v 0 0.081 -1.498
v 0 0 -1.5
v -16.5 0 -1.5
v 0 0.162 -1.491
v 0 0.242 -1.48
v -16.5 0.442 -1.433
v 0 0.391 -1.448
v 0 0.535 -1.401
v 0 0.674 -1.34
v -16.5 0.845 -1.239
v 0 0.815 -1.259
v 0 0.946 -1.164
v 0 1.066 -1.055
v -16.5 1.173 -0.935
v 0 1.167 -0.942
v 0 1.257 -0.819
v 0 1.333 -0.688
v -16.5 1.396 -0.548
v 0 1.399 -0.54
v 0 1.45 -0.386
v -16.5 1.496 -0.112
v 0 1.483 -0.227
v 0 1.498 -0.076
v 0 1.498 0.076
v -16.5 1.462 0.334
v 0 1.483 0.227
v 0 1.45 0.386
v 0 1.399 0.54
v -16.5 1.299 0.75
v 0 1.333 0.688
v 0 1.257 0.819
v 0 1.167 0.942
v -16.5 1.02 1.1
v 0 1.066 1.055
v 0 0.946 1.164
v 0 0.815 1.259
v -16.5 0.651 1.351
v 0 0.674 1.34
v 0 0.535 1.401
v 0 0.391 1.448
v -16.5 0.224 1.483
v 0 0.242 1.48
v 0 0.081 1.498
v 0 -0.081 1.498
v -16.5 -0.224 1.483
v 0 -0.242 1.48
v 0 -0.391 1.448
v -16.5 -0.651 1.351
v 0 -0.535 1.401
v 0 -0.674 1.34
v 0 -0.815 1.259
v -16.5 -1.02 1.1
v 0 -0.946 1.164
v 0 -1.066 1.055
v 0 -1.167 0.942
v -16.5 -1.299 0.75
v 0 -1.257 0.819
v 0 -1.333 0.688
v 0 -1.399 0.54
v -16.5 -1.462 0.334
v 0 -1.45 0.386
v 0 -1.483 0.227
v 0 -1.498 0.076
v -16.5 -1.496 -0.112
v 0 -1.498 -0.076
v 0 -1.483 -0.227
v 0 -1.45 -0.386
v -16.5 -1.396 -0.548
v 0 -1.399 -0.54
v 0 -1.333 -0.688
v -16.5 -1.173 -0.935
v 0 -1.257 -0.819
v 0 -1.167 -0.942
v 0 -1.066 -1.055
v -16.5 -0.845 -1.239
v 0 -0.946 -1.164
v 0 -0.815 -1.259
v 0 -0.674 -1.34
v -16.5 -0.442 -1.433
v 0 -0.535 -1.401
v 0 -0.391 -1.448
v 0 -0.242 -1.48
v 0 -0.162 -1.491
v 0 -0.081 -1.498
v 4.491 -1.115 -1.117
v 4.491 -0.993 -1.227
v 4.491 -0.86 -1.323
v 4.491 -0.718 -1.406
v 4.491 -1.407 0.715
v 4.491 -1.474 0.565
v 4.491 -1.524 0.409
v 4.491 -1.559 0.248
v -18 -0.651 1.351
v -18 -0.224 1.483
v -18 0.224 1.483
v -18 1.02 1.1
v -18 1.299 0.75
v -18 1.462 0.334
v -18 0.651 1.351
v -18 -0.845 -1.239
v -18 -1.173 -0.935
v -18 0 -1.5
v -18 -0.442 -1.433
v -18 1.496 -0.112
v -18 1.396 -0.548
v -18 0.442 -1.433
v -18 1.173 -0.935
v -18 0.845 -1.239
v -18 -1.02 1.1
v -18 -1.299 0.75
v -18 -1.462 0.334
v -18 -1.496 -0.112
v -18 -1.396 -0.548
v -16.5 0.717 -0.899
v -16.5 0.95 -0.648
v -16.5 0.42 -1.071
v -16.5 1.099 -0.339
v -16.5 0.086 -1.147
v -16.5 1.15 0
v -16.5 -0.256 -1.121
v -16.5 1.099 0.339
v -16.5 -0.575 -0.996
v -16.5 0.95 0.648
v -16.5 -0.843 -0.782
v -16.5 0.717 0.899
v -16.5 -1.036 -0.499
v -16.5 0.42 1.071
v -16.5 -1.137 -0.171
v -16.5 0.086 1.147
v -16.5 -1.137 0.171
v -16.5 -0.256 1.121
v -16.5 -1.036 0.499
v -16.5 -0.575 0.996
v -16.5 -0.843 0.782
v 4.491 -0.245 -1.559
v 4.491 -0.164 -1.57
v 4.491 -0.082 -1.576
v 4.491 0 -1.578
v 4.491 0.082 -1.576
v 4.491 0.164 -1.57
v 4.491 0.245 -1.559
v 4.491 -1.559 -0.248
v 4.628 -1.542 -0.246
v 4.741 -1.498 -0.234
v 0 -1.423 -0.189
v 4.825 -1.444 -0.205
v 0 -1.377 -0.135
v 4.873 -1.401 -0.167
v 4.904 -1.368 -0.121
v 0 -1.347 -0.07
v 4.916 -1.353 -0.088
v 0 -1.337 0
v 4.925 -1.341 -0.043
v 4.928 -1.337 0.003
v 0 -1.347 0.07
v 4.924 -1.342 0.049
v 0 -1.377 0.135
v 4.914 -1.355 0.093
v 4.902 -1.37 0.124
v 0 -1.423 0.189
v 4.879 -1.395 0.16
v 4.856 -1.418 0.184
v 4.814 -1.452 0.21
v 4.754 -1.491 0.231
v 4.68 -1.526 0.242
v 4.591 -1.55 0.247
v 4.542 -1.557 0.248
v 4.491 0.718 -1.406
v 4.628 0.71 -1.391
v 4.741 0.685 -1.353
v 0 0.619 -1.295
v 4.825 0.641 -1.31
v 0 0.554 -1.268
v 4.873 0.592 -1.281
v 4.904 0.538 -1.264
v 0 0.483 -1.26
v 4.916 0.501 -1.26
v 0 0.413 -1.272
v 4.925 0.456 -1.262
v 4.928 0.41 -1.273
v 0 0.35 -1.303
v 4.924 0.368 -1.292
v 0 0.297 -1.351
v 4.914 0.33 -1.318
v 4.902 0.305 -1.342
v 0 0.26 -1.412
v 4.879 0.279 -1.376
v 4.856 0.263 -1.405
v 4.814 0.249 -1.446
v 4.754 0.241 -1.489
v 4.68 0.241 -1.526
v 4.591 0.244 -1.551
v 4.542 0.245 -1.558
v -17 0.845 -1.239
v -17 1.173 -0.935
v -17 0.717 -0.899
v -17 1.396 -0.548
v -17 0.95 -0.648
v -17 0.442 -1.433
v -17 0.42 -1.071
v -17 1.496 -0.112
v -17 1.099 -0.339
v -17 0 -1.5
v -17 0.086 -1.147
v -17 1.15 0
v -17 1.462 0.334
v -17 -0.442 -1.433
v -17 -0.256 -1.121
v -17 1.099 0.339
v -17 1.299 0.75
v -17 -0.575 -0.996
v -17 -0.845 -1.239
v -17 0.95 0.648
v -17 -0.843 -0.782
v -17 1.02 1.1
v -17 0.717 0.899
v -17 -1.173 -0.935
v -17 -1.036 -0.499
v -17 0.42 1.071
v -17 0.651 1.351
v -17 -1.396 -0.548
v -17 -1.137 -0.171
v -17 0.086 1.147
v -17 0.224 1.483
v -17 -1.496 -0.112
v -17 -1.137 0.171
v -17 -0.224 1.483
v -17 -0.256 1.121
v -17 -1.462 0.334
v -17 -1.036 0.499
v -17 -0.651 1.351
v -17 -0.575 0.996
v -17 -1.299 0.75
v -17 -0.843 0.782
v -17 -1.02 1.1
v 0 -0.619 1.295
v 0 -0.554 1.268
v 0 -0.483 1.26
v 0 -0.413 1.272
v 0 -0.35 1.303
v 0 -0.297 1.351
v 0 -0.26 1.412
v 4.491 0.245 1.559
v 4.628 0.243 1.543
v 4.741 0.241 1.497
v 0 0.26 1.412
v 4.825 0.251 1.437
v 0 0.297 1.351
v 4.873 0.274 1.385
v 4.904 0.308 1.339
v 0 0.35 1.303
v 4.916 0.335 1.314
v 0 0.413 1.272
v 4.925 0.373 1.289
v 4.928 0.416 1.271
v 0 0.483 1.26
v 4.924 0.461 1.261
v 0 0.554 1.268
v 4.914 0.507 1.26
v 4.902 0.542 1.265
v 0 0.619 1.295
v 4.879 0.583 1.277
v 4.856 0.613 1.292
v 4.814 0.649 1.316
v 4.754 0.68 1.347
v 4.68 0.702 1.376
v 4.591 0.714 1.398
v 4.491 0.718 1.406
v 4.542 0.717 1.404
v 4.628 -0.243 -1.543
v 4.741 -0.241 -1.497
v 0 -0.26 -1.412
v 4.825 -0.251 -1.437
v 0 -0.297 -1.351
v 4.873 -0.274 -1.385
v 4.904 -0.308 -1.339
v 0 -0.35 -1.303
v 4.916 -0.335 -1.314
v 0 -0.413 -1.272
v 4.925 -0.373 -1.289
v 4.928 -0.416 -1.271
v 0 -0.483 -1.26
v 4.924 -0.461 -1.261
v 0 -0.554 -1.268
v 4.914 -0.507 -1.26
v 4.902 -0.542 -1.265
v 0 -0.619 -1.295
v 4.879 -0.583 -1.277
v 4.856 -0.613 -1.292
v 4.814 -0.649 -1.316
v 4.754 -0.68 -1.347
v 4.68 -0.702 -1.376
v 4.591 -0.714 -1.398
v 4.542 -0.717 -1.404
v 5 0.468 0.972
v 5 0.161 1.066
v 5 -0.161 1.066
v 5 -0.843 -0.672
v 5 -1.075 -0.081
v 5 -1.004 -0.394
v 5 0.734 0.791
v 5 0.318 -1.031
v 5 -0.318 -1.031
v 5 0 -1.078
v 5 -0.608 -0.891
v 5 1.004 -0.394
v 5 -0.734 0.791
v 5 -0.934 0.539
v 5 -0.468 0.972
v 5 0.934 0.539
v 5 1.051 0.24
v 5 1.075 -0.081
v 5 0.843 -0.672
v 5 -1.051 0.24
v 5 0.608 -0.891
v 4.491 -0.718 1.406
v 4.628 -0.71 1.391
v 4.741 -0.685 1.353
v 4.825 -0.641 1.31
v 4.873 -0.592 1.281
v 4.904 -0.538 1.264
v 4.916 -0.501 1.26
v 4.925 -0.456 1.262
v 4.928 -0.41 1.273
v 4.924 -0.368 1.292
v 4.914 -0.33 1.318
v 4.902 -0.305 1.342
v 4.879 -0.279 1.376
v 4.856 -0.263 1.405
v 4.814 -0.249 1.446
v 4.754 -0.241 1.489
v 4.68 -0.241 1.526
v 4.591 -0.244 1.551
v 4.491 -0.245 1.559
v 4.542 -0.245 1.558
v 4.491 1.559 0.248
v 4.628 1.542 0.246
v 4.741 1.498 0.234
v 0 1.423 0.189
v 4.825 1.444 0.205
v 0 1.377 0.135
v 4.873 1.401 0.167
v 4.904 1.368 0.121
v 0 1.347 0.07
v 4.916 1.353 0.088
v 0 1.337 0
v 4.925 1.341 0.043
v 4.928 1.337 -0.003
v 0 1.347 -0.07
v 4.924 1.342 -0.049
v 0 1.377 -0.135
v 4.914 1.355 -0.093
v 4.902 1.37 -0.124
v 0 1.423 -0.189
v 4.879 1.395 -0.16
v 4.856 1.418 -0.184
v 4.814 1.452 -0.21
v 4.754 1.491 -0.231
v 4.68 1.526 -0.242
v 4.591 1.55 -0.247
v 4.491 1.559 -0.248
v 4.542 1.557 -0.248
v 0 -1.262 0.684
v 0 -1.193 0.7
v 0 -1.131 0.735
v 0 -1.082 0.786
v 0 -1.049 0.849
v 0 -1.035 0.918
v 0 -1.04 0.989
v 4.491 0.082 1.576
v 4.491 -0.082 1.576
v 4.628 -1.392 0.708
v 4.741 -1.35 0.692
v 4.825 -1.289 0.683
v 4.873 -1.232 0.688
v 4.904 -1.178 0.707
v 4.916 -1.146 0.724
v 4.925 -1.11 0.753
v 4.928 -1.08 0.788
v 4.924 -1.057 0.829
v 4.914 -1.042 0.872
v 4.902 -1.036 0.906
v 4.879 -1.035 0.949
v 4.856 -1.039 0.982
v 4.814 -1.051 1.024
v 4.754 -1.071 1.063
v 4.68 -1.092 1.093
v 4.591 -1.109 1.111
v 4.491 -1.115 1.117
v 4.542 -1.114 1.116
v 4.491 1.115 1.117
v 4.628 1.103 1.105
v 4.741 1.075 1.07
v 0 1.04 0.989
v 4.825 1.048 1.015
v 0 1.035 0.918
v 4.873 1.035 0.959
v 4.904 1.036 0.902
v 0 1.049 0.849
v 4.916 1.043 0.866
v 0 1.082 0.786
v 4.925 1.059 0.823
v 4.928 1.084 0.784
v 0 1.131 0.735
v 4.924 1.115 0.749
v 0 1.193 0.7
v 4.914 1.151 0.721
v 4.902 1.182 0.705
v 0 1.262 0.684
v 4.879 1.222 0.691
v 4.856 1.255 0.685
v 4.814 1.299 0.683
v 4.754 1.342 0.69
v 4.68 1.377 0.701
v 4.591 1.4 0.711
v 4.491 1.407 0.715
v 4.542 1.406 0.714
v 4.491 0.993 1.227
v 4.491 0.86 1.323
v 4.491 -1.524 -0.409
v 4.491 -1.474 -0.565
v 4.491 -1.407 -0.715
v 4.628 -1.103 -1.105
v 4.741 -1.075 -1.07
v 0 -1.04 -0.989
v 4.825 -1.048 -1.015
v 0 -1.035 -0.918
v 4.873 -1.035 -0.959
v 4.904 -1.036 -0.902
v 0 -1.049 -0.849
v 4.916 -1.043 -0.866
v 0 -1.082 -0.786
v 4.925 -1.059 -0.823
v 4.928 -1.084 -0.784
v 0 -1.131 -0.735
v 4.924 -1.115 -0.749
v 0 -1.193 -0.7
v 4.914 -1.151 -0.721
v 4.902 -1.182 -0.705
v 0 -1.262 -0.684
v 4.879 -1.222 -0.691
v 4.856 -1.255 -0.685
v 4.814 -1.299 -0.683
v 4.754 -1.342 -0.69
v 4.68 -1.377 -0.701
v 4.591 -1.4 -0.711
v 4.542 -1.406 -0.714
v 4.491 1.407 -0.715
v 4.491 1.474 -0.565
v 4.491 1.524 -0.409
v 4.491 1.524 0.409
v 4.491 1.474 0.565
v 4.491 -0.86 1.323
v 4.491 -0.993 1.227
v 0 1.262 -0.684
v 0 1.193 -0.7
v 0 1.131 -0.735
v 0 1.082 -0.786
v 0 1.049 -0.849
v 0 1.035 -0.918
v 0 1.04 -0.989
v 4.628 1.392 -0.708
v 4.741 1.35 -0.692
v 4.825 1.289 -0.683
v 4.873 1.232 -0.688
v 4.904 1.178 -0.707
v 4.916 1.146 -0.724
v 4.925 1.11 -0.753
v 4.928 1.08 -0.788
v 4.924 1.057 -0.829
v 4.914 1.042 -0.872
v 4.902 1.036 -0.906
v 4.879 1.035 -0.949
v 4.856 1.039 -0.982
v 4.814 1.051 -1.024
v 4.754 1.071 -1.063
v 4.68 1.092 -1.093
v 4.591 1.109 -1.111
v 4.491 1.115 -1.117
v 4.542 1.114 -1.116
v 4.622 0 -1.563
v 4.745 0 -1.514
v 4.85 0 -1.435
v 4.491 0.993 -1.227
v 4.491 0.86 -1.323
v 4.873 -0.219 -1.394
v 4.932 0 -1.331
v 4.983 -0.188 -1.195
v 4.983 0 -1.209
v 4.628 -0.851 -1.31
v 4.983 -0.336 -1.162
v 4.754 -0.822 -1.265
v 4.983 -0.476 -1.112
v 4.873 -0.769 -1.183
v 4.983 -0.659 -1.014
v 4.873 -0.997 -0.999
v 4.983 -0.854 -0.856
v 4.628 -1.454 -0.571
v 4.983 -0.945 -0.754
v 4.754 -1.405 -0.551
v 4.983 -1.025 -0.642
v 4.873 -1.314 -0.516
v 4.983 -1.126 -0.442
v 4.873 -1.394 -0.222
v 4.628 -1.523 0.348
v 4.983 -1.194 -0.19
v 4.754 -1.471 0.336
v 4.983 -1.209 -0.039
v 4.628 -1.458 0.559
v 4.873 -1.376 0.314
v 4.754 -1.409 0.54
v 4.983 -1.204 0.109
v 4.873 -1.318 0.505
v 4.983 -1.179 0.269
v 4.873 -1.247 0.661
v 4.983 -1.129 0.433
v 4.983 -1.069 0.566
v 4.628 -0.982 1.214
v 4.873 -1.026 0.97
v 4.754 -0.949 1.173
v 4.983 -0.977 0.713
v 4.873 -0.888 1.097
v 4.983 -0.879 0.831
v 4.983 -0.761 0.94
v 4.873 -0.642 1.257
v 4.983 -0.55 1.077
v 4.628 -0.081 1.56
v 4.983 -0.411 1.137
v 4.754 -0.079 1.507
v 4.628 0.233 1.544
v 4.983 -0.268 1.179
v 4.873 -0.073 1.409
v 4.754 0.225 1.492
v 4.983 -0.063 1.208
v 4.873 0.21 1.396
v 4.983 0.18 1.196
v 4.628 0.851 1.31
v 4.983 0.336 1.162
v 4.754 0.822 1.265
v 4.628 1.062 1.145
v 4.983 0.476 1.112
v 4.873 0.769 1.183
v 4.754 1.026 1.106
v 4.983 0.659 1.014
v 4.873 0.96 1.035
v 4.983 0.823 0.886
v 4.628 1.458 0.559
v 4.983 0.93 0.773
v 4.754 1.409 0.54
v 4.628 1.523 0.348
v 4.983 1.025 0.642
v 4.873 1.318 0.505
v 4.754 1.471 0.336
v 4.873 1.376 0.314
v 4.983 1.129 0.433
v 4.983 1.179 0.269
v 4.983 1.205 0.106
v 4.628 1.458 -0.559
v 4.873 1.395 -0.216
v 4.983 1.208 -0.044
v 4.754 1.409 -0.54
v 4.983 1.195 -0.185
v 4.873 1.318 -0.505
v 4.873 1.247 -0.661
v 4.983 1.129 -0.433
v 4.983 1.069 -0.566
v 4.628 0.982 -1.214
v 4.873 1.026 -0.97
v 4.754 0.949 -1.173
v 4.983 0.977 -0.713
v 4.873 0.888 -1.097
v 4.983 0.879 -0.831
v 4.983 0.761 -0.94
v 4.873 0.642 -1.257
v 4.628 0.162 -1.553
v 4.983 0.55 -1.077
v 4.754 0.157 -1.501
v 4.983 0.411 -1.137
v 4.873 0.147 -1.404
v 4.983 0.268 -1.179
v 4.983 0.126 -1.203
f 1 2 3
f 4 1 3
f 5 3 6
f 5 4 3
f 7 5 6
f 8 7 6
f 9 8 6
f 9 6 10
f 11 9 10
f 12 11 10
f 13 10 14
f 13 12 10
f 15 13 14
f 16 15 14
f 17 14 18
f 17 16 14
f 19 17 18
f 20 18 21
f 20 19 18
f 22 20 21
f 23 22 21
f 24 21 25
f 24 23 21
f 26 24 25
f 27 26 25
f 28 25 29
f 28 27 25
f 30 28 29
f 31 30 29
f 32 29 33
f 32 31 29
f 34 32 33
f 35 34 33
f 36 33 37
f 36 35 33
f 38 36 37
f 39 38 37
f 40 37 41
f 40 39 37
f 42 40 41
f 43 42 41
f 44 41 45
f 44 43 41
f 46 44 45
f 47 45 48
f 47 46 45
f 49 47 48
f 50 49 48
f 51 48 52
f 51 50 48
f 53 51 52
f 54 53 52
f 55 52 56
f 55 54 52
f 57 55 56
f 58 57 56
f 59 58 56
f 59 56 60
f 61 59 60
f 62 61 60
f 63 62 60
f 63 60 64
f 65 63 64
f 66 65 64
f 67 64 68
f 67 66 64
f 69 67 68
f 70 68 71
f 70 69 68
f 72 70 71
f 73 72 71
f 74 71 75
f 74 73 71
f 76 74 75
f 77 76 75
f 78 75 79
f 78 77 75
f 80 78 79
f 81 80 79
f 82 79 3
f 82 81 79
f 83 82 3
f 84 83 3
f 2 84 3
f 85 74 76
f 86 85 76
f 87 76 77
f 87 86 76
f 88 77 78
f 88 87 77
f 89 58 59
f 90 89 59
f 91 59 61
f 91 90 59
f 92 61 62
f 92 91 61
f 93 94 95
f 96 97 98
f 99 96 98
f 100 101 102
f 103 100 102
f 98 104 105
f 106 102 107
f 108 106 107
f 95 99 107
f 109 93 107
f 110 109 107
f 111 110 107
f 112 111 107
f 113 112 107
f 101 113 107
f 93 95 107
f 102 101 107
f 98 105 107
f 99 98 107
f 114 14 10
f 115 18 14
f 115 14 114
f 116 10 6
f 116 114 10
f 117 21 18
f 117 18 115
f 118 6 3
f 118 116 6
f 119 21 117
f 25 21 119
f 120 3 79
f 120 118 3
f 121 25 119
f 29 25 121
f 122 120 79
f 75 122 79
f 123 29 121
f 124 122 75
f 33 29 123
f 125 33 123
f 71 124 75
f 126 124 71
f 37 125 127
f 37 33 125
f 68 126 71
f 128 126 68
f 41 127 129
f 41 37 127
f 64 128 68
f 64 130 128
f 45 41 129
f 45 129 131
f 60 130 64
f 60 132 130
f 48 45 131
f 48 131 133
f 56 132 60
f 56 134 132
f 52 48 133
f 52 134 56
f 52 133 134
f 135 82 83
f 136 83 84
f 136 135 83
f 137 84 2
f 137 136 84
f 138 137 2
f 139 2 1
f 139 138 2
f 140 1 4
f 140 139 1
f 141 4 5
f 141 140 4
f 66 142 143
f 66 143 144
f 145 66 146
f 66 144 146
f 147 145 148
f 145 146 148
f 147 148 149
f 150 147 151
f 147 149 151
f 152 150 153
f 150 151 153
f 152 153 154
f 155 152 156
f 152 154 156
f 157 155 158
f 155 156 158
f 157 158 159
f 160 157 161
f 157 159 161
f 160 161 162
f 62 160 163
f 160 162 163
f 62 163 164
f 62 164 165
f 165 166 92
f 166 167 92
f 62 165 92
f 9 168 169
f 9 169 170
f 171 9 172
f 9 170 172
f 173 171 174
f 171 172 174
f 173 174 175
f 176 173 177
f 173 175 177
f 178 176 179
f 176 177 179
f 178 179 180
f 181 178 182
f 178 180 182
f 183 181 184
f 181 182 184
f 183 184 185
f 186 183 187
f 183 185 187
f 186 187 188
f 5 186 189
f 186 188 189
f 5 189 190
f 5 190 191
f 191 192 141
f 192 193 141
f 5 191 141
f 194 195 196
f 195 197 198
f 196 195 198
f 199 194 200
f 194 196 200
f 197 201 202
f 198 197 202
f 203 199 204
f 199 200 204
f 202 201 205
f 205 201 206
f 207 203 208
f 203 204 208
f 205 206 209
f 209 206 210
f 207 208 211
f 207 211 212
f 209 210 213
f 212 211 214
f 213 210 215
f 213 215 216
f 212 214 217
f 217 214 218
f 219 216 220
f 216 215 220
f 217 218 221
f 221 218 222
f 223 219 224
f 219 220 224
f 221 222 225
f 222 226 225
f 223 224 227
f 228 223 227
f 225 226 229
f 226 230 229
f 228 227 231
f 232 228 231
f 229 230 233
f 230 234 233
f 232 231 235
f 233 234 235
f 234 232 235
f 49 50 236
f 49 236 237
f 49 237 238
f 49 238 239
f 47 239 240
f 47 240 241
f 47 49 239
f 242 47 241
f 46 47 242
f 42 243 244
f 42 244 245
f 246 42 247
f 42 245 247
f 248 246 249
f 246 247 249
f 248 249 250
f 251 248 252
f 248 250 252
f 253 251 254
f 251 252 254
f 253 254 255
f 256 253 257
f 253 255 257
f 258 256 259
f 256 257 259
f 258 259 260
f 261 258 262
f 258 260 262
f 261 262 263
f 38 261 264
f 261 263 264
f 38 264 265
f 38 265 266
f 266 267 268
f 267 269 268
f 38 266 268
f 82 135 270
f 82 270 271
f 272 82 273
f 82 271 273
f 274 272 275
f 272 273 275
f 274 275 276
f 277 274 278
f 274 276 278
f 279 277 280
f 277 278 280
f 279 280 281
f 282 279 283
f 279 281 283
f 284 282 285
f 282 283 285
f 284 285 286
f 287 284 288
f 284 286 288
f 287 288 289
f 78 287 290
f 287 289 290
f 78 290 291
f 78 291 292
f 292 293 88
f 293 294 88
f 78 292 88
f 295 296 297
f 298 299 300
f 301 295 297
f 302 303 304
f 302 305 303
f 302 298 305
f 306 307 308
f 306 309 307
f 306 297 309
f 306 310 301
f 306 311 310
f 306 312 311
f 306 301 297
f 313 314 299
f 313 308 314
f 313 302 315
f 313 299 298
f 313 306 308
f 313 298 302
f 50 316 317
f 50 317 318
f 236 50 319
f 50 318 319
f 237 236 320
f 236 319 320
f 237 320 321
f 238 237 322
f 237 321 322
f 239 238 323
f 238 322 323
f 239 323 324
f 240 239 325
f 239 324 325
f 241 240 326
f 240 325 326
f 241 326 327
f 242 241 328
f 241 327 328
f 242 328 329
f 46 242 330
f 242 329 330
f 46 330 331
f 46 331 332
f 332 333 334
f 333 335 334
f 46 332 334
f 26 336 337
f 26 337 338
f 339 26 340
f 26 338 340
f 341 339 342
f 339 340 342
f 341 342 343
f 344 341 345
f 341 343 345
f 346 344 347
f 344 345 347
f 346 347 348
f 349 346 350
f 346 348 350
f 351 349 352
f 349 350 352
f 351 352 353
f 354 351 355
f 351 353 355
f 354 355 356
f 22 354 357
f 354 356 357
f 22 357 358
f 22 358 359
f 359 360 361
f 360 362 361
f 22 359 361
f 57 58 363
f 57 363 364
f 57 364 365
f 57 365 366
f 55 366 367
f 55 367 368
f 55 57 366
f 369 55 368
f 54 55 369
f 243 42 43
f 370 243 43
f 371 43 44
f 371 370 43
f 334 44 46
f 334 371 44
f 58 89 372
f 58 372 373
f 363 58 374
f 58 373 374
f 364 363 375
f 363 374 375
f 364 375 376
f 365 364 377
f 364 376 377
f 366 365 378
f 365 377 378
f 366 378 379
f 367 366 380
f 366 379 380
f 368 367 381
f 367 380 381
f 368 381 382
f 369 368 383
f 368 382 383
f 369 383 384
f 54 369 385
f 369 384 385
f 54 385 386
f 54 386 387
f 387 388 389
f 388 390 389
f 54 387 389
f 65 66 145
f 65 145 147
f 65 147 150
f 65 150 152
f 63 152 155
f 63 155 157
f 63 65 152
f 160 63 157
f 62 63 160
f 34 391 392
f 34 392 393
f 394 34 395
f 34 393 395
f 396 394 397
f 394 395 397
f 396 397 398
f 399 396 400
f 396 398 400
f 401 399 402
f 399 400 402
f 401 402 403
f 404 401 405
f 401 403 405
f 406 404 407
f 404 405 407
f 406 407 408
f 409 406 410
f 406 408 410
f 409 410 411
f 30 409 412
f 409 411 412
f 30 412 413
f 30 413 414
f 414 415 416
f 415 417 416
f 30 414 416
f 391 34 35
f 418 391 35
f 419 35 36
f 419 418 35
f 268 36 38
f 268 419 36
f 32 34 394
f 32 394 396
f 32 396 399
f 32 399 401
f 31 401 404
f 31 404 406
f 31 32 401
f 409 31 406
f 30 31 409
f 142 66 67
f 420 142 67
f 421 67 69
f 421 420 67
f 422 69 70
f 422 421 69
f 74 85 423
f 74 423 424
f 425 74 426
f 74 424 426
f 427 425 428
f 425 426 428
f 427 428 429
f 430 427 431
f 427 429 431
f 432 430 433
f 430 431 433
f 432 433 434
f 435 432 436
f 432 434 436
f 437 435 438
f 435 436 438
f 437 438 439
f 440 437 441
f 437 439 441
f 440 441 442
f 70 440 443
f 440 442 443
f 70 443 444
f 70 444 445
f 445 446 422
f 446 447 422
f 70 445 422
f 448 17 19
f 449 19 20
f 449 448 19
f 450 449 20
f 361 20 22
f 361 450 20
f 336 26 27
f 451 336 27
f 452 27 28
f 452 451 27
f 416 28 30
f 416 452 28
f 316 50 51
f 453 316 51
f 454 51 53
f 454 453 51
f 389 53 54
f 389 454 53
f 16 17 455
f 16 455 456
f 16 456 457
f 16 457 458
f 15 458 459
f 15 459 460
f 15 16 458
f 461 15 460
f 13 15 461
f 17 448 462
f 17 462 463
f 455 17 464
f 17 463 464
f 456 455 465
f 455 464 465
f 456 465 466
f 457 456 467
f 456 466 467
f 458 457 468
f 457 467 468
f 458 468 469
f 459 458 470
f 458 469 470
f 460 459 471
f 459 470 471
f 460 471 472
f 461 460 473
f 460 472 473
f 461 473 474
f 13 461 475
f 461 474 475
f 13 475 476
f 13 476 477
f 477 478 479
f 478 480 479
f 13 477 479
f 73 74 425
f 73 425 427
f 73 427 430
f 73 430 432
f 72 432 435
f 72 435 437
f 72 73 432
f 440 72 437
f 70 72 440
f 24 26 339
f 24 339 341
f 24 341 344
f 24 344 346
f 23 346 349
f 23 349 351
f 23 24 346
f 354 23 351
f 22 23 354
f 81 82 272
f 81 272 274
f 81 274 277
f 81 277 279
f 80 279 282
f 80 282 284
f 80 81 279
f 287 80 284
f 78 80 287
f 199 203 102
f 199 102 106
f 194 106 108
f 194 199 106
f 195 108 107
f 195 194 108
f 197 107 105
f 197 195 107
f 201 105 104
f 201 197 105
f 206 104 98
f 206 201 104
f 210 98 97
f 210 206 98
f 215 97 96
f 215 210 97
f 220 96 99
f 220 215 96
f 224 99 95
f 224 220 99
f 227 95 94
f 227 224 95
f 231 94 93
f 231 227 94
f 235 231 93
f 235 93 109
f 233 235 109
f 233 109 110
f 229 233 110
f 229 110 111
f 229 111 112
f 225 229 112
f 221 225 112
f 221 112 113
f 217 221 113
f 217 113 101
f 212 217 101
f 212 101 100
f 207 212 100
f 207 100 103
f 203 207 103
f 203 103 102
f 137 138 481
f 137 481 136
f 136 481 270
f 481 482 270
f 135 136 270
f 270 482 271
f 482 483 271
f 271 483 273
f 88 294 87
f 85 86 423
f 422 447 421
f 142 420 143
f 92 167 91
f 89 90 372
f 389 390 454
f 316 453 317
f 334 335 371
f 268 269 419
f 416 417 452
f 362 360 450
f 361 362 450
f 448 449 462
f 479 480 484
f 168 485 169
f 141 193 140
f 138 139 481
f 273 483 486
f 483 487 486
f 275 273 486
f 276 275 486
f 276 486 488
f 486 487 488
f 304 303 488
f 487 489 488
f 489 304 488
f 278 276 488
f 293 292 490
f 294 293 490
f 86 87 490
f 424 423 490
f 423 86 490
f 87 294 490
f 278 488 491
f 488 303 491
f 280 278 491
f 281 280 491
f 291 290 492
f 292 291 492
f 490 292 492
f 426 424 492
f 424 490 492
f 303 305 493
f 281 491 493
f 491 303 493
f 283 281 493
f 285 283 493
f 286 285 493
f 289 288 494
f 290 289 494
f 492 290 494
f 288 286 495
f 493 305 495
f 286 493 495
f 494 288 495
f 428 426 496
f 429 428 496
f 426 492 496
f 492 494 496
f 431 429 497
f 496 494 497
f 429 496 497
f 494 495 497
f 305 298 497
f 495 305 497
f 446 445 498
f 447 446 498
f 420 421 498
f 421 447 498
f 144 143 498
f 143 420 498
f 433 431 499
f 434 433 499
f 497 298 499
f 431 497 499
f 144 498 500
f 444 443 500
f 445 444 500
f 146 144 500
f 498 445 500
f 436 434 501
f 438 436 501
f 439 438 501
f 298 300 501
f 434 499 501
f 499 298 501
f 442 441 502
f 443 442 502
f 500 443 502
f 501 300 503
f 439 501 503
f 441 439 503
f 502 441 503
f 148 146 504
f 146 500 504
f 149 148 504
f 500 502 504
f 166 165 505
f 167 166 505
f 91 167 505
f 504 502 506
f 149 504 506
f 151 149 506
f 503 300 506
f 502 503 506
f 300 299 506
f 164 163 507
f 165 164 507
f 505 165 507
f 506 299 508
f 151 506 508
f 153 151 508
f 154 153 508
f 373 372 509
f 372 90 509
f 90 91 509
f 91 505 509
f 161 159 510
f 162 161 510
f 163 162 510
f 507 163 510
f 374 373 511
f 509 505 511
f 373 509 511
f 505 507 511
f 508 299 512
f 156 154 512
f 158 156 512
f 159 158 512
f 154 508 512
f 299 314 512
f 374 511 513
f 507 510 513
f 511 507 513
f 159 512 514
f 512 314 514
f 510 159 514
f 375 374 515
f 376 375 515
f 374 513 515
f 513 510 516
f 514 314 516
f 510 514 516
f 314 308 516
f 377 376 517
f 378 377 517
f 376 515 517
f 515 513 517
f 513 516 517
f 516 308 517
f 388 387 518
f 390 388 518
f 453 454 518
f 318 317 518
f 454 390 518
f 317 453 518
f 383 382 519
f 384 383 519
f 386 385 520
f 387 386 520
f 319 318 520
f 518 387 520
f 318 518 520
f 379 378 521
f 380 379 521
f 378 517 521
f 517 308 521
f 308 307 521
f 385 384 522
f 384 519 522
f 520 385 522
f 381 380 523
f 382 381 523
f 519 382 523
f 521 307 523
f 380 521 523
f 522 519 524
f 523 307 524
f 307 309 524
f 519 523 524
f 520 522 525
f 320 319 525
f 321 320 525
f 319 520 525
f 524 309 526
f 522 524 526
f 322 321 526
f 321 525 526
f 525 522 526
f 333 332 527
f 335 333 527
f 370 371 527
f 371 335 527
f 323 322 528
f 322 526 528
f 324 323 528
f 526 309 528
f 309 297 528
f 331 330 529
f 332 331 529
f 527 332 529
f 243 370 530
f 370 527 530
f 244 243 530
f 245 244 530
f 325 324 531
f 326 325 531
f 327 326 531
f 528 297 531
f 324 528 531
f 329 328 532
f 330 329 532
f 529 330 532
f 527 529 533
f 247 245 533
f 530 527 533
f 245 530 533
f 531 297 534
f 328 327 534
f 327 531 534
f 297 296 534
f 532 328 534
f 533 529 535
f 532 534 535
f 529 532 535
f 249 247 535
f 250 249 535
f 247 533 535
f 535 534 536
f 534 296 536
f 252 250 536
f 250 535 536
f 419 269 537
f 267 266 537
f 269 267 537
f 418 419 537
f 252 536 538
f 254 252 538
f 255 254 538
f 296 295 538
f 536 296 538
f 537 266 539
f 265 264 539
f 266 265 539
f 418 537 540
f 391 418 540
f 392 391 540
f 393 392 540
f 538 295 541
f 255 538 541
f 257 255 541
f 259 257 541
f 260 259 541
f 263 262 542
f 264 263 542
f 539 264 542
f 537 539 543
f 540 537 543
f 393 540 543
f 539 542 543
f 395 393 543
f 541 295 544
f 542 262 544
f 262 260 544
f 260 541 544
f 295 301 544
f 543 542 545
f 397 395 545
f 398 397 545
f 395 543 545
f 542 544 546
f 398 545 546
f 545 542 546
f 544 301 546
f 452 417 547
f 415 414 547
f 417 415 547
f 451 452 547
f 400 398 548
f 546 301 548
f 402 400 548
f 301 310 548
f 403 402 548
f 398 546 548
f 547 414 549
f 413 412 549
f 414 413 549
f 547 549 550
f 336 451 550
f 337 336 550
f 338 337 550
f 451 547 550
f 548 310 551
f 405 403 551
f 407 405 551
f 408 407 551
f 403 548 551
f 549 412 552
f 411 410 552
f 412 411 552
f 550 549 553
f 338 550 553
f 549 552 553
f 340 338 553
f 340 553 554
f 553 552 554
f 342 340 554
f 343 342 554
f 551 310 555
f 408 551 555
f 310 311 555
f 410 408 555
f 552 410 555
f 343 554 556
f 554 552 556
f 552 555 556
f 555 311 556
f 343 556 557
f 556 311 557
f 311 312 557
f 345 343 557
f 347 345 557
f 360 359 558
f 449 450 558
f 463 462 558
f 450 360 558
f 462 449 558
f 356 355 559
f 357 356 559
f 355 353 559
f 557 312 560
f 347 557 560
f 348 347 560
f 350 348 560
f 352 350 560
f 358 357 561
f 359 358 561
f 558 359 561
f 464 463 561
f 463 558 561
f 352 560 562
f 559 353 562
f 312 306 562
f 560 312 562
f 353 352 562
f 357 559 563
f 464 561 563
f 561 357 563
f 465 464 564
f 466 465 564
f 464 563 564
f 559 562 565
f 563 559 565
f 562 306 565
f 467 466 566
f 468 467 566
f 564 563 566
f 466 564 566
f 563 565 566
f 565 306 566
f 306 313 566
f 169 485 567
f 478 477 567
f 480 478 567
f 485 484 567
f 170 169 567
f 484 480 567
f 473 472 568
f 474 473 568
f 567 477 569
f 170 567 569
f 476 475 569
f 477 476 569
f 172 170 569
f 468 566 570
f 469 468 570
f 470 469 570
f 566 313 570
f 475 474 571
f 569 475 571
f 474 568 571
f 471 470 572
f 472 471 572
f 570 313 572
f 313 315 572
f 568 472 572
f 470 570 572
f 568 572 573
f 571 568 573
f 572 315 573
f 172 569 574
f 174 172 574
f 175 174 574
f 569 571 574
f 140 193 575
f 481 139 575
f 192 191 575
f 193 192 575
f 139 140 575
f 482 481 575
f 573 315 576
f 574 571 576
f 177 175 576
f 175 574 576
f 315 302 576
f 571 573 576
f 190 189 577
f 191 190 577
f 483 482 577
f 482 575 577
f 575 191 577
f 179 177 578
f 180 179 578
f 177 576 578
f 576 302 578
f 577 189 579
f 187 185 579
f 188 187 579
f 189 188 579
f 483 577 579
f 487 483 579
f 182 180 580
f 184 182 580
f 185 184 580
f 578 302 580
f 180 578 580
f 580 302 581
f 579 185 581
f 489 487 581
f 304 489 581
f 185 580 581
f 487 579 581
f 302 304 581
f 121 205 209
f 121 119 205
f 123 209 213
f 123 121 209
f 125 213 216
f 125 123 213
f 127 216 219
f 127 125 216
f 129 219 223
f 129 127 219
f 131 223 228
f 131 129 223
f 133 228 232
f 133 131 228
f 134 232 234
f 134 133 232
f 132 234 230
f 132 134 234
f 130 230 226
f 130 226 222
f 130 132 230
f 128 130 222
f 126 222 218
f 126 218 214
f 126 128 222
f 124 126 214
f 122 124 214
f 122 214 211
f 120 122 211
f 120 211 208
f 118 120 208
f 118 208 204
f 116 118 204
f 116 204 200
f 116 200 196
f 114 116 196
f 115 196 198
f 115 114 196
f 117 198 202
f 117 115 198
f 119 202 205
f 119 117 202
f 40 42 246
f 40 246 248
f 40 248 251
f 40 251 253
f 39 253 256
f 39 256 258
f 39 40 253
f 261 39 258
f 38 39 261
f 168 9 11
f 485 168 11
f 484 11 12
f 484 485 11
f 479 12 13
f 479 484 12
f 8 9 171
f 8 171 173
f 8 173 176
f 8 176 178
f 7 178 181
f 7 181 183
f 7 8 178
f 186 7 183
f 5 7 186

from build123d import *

# Parameters (mm, degrees)
SKETCH1_R                = 1.5
EXTRUDE1_DEPTH           = 18
EXTRUDE1_OTHER_WAY_DEPTH = 5
EXTRUDE1_OTHER_WAY_TAPER = -1
FILLET1_R                = 0.5
SKETCH2_R                = 0.25
CUT_EXTRUDE1_DEPTH       = 5
CIRPATTERN1_COUNT        = 10
SKETCH3_W                = 0.5
SKETCH3_H                = 0.930924855


with BuildPart() as part:
    # Sketch1 → Extrude1 (new body)
    with BuildSketch(Plane(origin=(0, 0, 0), x_dir=(0, 0, -1), z_dir=(1, 0, 0))):
        Circle(SKETCH1_R)
    extrude(amount=-EXTRUDE1_DEPTH)

    # Sketch1 → Extrude1 other way (add)
    with BuildSketch(Plane(origin=(0, 0, 0), x_dir=(0, 0, -1), z_dir=(1, 0, 0))):
        Circle(SKETCH1_R)
    extrude(amount=EXTRUDE1_OTHER_WAY_DEPTH, taper=EXTRUDE1_OTHER_WAY_TAPER)

    # Fillet1
    fillet1_edges = [part.edges().sort_by_distance(p)[0] for p in [
        (5, 0, 1.587275325),
    ]]
    fillet(fillet1_edges, radius=FILLET1_R)

    # Sketch2 → Cut-Extrude1 (cut)
    with BuildSketch(Plane(origin=(5, 0, 0), x_dir=(0, 0, -1), z_dir=(1, 0, 0))):
        with Locations((0, 1.587275325)):
            Circle(SKETCH2_R)
    cut_extrude1 = extrude(amount=-CUT_EXTRUDE1_DEPTH, mode=Mode.SUBTRACT)

    # CirPattern1: Cut-Extrude1 ×10 about axis
    cirpattern1_axis = Axis((0, 0, 0), (1, 0, 0))
    for i in range(1, CIRPATTERN1_COUNT):
        add(cut_extrude1.rotate(cirpattern1_axis, i * 360 / CIRPATTERN1_COUNT), mode=Mode.SUBTRACT)

    # Sketch3 → Cut-Revolve2 (revolve, cut)
    with BuildSketch(Plane.XY):
        with Locations((-16.75, 1.615462428)):
            Rectangle(SKETCH3_W, SKETCH3_H)
    revolve(axis=Axis((-18, 0, 0), (1, 0, 0)), mode=Mode.SUBTRACT)


solid = part.part
